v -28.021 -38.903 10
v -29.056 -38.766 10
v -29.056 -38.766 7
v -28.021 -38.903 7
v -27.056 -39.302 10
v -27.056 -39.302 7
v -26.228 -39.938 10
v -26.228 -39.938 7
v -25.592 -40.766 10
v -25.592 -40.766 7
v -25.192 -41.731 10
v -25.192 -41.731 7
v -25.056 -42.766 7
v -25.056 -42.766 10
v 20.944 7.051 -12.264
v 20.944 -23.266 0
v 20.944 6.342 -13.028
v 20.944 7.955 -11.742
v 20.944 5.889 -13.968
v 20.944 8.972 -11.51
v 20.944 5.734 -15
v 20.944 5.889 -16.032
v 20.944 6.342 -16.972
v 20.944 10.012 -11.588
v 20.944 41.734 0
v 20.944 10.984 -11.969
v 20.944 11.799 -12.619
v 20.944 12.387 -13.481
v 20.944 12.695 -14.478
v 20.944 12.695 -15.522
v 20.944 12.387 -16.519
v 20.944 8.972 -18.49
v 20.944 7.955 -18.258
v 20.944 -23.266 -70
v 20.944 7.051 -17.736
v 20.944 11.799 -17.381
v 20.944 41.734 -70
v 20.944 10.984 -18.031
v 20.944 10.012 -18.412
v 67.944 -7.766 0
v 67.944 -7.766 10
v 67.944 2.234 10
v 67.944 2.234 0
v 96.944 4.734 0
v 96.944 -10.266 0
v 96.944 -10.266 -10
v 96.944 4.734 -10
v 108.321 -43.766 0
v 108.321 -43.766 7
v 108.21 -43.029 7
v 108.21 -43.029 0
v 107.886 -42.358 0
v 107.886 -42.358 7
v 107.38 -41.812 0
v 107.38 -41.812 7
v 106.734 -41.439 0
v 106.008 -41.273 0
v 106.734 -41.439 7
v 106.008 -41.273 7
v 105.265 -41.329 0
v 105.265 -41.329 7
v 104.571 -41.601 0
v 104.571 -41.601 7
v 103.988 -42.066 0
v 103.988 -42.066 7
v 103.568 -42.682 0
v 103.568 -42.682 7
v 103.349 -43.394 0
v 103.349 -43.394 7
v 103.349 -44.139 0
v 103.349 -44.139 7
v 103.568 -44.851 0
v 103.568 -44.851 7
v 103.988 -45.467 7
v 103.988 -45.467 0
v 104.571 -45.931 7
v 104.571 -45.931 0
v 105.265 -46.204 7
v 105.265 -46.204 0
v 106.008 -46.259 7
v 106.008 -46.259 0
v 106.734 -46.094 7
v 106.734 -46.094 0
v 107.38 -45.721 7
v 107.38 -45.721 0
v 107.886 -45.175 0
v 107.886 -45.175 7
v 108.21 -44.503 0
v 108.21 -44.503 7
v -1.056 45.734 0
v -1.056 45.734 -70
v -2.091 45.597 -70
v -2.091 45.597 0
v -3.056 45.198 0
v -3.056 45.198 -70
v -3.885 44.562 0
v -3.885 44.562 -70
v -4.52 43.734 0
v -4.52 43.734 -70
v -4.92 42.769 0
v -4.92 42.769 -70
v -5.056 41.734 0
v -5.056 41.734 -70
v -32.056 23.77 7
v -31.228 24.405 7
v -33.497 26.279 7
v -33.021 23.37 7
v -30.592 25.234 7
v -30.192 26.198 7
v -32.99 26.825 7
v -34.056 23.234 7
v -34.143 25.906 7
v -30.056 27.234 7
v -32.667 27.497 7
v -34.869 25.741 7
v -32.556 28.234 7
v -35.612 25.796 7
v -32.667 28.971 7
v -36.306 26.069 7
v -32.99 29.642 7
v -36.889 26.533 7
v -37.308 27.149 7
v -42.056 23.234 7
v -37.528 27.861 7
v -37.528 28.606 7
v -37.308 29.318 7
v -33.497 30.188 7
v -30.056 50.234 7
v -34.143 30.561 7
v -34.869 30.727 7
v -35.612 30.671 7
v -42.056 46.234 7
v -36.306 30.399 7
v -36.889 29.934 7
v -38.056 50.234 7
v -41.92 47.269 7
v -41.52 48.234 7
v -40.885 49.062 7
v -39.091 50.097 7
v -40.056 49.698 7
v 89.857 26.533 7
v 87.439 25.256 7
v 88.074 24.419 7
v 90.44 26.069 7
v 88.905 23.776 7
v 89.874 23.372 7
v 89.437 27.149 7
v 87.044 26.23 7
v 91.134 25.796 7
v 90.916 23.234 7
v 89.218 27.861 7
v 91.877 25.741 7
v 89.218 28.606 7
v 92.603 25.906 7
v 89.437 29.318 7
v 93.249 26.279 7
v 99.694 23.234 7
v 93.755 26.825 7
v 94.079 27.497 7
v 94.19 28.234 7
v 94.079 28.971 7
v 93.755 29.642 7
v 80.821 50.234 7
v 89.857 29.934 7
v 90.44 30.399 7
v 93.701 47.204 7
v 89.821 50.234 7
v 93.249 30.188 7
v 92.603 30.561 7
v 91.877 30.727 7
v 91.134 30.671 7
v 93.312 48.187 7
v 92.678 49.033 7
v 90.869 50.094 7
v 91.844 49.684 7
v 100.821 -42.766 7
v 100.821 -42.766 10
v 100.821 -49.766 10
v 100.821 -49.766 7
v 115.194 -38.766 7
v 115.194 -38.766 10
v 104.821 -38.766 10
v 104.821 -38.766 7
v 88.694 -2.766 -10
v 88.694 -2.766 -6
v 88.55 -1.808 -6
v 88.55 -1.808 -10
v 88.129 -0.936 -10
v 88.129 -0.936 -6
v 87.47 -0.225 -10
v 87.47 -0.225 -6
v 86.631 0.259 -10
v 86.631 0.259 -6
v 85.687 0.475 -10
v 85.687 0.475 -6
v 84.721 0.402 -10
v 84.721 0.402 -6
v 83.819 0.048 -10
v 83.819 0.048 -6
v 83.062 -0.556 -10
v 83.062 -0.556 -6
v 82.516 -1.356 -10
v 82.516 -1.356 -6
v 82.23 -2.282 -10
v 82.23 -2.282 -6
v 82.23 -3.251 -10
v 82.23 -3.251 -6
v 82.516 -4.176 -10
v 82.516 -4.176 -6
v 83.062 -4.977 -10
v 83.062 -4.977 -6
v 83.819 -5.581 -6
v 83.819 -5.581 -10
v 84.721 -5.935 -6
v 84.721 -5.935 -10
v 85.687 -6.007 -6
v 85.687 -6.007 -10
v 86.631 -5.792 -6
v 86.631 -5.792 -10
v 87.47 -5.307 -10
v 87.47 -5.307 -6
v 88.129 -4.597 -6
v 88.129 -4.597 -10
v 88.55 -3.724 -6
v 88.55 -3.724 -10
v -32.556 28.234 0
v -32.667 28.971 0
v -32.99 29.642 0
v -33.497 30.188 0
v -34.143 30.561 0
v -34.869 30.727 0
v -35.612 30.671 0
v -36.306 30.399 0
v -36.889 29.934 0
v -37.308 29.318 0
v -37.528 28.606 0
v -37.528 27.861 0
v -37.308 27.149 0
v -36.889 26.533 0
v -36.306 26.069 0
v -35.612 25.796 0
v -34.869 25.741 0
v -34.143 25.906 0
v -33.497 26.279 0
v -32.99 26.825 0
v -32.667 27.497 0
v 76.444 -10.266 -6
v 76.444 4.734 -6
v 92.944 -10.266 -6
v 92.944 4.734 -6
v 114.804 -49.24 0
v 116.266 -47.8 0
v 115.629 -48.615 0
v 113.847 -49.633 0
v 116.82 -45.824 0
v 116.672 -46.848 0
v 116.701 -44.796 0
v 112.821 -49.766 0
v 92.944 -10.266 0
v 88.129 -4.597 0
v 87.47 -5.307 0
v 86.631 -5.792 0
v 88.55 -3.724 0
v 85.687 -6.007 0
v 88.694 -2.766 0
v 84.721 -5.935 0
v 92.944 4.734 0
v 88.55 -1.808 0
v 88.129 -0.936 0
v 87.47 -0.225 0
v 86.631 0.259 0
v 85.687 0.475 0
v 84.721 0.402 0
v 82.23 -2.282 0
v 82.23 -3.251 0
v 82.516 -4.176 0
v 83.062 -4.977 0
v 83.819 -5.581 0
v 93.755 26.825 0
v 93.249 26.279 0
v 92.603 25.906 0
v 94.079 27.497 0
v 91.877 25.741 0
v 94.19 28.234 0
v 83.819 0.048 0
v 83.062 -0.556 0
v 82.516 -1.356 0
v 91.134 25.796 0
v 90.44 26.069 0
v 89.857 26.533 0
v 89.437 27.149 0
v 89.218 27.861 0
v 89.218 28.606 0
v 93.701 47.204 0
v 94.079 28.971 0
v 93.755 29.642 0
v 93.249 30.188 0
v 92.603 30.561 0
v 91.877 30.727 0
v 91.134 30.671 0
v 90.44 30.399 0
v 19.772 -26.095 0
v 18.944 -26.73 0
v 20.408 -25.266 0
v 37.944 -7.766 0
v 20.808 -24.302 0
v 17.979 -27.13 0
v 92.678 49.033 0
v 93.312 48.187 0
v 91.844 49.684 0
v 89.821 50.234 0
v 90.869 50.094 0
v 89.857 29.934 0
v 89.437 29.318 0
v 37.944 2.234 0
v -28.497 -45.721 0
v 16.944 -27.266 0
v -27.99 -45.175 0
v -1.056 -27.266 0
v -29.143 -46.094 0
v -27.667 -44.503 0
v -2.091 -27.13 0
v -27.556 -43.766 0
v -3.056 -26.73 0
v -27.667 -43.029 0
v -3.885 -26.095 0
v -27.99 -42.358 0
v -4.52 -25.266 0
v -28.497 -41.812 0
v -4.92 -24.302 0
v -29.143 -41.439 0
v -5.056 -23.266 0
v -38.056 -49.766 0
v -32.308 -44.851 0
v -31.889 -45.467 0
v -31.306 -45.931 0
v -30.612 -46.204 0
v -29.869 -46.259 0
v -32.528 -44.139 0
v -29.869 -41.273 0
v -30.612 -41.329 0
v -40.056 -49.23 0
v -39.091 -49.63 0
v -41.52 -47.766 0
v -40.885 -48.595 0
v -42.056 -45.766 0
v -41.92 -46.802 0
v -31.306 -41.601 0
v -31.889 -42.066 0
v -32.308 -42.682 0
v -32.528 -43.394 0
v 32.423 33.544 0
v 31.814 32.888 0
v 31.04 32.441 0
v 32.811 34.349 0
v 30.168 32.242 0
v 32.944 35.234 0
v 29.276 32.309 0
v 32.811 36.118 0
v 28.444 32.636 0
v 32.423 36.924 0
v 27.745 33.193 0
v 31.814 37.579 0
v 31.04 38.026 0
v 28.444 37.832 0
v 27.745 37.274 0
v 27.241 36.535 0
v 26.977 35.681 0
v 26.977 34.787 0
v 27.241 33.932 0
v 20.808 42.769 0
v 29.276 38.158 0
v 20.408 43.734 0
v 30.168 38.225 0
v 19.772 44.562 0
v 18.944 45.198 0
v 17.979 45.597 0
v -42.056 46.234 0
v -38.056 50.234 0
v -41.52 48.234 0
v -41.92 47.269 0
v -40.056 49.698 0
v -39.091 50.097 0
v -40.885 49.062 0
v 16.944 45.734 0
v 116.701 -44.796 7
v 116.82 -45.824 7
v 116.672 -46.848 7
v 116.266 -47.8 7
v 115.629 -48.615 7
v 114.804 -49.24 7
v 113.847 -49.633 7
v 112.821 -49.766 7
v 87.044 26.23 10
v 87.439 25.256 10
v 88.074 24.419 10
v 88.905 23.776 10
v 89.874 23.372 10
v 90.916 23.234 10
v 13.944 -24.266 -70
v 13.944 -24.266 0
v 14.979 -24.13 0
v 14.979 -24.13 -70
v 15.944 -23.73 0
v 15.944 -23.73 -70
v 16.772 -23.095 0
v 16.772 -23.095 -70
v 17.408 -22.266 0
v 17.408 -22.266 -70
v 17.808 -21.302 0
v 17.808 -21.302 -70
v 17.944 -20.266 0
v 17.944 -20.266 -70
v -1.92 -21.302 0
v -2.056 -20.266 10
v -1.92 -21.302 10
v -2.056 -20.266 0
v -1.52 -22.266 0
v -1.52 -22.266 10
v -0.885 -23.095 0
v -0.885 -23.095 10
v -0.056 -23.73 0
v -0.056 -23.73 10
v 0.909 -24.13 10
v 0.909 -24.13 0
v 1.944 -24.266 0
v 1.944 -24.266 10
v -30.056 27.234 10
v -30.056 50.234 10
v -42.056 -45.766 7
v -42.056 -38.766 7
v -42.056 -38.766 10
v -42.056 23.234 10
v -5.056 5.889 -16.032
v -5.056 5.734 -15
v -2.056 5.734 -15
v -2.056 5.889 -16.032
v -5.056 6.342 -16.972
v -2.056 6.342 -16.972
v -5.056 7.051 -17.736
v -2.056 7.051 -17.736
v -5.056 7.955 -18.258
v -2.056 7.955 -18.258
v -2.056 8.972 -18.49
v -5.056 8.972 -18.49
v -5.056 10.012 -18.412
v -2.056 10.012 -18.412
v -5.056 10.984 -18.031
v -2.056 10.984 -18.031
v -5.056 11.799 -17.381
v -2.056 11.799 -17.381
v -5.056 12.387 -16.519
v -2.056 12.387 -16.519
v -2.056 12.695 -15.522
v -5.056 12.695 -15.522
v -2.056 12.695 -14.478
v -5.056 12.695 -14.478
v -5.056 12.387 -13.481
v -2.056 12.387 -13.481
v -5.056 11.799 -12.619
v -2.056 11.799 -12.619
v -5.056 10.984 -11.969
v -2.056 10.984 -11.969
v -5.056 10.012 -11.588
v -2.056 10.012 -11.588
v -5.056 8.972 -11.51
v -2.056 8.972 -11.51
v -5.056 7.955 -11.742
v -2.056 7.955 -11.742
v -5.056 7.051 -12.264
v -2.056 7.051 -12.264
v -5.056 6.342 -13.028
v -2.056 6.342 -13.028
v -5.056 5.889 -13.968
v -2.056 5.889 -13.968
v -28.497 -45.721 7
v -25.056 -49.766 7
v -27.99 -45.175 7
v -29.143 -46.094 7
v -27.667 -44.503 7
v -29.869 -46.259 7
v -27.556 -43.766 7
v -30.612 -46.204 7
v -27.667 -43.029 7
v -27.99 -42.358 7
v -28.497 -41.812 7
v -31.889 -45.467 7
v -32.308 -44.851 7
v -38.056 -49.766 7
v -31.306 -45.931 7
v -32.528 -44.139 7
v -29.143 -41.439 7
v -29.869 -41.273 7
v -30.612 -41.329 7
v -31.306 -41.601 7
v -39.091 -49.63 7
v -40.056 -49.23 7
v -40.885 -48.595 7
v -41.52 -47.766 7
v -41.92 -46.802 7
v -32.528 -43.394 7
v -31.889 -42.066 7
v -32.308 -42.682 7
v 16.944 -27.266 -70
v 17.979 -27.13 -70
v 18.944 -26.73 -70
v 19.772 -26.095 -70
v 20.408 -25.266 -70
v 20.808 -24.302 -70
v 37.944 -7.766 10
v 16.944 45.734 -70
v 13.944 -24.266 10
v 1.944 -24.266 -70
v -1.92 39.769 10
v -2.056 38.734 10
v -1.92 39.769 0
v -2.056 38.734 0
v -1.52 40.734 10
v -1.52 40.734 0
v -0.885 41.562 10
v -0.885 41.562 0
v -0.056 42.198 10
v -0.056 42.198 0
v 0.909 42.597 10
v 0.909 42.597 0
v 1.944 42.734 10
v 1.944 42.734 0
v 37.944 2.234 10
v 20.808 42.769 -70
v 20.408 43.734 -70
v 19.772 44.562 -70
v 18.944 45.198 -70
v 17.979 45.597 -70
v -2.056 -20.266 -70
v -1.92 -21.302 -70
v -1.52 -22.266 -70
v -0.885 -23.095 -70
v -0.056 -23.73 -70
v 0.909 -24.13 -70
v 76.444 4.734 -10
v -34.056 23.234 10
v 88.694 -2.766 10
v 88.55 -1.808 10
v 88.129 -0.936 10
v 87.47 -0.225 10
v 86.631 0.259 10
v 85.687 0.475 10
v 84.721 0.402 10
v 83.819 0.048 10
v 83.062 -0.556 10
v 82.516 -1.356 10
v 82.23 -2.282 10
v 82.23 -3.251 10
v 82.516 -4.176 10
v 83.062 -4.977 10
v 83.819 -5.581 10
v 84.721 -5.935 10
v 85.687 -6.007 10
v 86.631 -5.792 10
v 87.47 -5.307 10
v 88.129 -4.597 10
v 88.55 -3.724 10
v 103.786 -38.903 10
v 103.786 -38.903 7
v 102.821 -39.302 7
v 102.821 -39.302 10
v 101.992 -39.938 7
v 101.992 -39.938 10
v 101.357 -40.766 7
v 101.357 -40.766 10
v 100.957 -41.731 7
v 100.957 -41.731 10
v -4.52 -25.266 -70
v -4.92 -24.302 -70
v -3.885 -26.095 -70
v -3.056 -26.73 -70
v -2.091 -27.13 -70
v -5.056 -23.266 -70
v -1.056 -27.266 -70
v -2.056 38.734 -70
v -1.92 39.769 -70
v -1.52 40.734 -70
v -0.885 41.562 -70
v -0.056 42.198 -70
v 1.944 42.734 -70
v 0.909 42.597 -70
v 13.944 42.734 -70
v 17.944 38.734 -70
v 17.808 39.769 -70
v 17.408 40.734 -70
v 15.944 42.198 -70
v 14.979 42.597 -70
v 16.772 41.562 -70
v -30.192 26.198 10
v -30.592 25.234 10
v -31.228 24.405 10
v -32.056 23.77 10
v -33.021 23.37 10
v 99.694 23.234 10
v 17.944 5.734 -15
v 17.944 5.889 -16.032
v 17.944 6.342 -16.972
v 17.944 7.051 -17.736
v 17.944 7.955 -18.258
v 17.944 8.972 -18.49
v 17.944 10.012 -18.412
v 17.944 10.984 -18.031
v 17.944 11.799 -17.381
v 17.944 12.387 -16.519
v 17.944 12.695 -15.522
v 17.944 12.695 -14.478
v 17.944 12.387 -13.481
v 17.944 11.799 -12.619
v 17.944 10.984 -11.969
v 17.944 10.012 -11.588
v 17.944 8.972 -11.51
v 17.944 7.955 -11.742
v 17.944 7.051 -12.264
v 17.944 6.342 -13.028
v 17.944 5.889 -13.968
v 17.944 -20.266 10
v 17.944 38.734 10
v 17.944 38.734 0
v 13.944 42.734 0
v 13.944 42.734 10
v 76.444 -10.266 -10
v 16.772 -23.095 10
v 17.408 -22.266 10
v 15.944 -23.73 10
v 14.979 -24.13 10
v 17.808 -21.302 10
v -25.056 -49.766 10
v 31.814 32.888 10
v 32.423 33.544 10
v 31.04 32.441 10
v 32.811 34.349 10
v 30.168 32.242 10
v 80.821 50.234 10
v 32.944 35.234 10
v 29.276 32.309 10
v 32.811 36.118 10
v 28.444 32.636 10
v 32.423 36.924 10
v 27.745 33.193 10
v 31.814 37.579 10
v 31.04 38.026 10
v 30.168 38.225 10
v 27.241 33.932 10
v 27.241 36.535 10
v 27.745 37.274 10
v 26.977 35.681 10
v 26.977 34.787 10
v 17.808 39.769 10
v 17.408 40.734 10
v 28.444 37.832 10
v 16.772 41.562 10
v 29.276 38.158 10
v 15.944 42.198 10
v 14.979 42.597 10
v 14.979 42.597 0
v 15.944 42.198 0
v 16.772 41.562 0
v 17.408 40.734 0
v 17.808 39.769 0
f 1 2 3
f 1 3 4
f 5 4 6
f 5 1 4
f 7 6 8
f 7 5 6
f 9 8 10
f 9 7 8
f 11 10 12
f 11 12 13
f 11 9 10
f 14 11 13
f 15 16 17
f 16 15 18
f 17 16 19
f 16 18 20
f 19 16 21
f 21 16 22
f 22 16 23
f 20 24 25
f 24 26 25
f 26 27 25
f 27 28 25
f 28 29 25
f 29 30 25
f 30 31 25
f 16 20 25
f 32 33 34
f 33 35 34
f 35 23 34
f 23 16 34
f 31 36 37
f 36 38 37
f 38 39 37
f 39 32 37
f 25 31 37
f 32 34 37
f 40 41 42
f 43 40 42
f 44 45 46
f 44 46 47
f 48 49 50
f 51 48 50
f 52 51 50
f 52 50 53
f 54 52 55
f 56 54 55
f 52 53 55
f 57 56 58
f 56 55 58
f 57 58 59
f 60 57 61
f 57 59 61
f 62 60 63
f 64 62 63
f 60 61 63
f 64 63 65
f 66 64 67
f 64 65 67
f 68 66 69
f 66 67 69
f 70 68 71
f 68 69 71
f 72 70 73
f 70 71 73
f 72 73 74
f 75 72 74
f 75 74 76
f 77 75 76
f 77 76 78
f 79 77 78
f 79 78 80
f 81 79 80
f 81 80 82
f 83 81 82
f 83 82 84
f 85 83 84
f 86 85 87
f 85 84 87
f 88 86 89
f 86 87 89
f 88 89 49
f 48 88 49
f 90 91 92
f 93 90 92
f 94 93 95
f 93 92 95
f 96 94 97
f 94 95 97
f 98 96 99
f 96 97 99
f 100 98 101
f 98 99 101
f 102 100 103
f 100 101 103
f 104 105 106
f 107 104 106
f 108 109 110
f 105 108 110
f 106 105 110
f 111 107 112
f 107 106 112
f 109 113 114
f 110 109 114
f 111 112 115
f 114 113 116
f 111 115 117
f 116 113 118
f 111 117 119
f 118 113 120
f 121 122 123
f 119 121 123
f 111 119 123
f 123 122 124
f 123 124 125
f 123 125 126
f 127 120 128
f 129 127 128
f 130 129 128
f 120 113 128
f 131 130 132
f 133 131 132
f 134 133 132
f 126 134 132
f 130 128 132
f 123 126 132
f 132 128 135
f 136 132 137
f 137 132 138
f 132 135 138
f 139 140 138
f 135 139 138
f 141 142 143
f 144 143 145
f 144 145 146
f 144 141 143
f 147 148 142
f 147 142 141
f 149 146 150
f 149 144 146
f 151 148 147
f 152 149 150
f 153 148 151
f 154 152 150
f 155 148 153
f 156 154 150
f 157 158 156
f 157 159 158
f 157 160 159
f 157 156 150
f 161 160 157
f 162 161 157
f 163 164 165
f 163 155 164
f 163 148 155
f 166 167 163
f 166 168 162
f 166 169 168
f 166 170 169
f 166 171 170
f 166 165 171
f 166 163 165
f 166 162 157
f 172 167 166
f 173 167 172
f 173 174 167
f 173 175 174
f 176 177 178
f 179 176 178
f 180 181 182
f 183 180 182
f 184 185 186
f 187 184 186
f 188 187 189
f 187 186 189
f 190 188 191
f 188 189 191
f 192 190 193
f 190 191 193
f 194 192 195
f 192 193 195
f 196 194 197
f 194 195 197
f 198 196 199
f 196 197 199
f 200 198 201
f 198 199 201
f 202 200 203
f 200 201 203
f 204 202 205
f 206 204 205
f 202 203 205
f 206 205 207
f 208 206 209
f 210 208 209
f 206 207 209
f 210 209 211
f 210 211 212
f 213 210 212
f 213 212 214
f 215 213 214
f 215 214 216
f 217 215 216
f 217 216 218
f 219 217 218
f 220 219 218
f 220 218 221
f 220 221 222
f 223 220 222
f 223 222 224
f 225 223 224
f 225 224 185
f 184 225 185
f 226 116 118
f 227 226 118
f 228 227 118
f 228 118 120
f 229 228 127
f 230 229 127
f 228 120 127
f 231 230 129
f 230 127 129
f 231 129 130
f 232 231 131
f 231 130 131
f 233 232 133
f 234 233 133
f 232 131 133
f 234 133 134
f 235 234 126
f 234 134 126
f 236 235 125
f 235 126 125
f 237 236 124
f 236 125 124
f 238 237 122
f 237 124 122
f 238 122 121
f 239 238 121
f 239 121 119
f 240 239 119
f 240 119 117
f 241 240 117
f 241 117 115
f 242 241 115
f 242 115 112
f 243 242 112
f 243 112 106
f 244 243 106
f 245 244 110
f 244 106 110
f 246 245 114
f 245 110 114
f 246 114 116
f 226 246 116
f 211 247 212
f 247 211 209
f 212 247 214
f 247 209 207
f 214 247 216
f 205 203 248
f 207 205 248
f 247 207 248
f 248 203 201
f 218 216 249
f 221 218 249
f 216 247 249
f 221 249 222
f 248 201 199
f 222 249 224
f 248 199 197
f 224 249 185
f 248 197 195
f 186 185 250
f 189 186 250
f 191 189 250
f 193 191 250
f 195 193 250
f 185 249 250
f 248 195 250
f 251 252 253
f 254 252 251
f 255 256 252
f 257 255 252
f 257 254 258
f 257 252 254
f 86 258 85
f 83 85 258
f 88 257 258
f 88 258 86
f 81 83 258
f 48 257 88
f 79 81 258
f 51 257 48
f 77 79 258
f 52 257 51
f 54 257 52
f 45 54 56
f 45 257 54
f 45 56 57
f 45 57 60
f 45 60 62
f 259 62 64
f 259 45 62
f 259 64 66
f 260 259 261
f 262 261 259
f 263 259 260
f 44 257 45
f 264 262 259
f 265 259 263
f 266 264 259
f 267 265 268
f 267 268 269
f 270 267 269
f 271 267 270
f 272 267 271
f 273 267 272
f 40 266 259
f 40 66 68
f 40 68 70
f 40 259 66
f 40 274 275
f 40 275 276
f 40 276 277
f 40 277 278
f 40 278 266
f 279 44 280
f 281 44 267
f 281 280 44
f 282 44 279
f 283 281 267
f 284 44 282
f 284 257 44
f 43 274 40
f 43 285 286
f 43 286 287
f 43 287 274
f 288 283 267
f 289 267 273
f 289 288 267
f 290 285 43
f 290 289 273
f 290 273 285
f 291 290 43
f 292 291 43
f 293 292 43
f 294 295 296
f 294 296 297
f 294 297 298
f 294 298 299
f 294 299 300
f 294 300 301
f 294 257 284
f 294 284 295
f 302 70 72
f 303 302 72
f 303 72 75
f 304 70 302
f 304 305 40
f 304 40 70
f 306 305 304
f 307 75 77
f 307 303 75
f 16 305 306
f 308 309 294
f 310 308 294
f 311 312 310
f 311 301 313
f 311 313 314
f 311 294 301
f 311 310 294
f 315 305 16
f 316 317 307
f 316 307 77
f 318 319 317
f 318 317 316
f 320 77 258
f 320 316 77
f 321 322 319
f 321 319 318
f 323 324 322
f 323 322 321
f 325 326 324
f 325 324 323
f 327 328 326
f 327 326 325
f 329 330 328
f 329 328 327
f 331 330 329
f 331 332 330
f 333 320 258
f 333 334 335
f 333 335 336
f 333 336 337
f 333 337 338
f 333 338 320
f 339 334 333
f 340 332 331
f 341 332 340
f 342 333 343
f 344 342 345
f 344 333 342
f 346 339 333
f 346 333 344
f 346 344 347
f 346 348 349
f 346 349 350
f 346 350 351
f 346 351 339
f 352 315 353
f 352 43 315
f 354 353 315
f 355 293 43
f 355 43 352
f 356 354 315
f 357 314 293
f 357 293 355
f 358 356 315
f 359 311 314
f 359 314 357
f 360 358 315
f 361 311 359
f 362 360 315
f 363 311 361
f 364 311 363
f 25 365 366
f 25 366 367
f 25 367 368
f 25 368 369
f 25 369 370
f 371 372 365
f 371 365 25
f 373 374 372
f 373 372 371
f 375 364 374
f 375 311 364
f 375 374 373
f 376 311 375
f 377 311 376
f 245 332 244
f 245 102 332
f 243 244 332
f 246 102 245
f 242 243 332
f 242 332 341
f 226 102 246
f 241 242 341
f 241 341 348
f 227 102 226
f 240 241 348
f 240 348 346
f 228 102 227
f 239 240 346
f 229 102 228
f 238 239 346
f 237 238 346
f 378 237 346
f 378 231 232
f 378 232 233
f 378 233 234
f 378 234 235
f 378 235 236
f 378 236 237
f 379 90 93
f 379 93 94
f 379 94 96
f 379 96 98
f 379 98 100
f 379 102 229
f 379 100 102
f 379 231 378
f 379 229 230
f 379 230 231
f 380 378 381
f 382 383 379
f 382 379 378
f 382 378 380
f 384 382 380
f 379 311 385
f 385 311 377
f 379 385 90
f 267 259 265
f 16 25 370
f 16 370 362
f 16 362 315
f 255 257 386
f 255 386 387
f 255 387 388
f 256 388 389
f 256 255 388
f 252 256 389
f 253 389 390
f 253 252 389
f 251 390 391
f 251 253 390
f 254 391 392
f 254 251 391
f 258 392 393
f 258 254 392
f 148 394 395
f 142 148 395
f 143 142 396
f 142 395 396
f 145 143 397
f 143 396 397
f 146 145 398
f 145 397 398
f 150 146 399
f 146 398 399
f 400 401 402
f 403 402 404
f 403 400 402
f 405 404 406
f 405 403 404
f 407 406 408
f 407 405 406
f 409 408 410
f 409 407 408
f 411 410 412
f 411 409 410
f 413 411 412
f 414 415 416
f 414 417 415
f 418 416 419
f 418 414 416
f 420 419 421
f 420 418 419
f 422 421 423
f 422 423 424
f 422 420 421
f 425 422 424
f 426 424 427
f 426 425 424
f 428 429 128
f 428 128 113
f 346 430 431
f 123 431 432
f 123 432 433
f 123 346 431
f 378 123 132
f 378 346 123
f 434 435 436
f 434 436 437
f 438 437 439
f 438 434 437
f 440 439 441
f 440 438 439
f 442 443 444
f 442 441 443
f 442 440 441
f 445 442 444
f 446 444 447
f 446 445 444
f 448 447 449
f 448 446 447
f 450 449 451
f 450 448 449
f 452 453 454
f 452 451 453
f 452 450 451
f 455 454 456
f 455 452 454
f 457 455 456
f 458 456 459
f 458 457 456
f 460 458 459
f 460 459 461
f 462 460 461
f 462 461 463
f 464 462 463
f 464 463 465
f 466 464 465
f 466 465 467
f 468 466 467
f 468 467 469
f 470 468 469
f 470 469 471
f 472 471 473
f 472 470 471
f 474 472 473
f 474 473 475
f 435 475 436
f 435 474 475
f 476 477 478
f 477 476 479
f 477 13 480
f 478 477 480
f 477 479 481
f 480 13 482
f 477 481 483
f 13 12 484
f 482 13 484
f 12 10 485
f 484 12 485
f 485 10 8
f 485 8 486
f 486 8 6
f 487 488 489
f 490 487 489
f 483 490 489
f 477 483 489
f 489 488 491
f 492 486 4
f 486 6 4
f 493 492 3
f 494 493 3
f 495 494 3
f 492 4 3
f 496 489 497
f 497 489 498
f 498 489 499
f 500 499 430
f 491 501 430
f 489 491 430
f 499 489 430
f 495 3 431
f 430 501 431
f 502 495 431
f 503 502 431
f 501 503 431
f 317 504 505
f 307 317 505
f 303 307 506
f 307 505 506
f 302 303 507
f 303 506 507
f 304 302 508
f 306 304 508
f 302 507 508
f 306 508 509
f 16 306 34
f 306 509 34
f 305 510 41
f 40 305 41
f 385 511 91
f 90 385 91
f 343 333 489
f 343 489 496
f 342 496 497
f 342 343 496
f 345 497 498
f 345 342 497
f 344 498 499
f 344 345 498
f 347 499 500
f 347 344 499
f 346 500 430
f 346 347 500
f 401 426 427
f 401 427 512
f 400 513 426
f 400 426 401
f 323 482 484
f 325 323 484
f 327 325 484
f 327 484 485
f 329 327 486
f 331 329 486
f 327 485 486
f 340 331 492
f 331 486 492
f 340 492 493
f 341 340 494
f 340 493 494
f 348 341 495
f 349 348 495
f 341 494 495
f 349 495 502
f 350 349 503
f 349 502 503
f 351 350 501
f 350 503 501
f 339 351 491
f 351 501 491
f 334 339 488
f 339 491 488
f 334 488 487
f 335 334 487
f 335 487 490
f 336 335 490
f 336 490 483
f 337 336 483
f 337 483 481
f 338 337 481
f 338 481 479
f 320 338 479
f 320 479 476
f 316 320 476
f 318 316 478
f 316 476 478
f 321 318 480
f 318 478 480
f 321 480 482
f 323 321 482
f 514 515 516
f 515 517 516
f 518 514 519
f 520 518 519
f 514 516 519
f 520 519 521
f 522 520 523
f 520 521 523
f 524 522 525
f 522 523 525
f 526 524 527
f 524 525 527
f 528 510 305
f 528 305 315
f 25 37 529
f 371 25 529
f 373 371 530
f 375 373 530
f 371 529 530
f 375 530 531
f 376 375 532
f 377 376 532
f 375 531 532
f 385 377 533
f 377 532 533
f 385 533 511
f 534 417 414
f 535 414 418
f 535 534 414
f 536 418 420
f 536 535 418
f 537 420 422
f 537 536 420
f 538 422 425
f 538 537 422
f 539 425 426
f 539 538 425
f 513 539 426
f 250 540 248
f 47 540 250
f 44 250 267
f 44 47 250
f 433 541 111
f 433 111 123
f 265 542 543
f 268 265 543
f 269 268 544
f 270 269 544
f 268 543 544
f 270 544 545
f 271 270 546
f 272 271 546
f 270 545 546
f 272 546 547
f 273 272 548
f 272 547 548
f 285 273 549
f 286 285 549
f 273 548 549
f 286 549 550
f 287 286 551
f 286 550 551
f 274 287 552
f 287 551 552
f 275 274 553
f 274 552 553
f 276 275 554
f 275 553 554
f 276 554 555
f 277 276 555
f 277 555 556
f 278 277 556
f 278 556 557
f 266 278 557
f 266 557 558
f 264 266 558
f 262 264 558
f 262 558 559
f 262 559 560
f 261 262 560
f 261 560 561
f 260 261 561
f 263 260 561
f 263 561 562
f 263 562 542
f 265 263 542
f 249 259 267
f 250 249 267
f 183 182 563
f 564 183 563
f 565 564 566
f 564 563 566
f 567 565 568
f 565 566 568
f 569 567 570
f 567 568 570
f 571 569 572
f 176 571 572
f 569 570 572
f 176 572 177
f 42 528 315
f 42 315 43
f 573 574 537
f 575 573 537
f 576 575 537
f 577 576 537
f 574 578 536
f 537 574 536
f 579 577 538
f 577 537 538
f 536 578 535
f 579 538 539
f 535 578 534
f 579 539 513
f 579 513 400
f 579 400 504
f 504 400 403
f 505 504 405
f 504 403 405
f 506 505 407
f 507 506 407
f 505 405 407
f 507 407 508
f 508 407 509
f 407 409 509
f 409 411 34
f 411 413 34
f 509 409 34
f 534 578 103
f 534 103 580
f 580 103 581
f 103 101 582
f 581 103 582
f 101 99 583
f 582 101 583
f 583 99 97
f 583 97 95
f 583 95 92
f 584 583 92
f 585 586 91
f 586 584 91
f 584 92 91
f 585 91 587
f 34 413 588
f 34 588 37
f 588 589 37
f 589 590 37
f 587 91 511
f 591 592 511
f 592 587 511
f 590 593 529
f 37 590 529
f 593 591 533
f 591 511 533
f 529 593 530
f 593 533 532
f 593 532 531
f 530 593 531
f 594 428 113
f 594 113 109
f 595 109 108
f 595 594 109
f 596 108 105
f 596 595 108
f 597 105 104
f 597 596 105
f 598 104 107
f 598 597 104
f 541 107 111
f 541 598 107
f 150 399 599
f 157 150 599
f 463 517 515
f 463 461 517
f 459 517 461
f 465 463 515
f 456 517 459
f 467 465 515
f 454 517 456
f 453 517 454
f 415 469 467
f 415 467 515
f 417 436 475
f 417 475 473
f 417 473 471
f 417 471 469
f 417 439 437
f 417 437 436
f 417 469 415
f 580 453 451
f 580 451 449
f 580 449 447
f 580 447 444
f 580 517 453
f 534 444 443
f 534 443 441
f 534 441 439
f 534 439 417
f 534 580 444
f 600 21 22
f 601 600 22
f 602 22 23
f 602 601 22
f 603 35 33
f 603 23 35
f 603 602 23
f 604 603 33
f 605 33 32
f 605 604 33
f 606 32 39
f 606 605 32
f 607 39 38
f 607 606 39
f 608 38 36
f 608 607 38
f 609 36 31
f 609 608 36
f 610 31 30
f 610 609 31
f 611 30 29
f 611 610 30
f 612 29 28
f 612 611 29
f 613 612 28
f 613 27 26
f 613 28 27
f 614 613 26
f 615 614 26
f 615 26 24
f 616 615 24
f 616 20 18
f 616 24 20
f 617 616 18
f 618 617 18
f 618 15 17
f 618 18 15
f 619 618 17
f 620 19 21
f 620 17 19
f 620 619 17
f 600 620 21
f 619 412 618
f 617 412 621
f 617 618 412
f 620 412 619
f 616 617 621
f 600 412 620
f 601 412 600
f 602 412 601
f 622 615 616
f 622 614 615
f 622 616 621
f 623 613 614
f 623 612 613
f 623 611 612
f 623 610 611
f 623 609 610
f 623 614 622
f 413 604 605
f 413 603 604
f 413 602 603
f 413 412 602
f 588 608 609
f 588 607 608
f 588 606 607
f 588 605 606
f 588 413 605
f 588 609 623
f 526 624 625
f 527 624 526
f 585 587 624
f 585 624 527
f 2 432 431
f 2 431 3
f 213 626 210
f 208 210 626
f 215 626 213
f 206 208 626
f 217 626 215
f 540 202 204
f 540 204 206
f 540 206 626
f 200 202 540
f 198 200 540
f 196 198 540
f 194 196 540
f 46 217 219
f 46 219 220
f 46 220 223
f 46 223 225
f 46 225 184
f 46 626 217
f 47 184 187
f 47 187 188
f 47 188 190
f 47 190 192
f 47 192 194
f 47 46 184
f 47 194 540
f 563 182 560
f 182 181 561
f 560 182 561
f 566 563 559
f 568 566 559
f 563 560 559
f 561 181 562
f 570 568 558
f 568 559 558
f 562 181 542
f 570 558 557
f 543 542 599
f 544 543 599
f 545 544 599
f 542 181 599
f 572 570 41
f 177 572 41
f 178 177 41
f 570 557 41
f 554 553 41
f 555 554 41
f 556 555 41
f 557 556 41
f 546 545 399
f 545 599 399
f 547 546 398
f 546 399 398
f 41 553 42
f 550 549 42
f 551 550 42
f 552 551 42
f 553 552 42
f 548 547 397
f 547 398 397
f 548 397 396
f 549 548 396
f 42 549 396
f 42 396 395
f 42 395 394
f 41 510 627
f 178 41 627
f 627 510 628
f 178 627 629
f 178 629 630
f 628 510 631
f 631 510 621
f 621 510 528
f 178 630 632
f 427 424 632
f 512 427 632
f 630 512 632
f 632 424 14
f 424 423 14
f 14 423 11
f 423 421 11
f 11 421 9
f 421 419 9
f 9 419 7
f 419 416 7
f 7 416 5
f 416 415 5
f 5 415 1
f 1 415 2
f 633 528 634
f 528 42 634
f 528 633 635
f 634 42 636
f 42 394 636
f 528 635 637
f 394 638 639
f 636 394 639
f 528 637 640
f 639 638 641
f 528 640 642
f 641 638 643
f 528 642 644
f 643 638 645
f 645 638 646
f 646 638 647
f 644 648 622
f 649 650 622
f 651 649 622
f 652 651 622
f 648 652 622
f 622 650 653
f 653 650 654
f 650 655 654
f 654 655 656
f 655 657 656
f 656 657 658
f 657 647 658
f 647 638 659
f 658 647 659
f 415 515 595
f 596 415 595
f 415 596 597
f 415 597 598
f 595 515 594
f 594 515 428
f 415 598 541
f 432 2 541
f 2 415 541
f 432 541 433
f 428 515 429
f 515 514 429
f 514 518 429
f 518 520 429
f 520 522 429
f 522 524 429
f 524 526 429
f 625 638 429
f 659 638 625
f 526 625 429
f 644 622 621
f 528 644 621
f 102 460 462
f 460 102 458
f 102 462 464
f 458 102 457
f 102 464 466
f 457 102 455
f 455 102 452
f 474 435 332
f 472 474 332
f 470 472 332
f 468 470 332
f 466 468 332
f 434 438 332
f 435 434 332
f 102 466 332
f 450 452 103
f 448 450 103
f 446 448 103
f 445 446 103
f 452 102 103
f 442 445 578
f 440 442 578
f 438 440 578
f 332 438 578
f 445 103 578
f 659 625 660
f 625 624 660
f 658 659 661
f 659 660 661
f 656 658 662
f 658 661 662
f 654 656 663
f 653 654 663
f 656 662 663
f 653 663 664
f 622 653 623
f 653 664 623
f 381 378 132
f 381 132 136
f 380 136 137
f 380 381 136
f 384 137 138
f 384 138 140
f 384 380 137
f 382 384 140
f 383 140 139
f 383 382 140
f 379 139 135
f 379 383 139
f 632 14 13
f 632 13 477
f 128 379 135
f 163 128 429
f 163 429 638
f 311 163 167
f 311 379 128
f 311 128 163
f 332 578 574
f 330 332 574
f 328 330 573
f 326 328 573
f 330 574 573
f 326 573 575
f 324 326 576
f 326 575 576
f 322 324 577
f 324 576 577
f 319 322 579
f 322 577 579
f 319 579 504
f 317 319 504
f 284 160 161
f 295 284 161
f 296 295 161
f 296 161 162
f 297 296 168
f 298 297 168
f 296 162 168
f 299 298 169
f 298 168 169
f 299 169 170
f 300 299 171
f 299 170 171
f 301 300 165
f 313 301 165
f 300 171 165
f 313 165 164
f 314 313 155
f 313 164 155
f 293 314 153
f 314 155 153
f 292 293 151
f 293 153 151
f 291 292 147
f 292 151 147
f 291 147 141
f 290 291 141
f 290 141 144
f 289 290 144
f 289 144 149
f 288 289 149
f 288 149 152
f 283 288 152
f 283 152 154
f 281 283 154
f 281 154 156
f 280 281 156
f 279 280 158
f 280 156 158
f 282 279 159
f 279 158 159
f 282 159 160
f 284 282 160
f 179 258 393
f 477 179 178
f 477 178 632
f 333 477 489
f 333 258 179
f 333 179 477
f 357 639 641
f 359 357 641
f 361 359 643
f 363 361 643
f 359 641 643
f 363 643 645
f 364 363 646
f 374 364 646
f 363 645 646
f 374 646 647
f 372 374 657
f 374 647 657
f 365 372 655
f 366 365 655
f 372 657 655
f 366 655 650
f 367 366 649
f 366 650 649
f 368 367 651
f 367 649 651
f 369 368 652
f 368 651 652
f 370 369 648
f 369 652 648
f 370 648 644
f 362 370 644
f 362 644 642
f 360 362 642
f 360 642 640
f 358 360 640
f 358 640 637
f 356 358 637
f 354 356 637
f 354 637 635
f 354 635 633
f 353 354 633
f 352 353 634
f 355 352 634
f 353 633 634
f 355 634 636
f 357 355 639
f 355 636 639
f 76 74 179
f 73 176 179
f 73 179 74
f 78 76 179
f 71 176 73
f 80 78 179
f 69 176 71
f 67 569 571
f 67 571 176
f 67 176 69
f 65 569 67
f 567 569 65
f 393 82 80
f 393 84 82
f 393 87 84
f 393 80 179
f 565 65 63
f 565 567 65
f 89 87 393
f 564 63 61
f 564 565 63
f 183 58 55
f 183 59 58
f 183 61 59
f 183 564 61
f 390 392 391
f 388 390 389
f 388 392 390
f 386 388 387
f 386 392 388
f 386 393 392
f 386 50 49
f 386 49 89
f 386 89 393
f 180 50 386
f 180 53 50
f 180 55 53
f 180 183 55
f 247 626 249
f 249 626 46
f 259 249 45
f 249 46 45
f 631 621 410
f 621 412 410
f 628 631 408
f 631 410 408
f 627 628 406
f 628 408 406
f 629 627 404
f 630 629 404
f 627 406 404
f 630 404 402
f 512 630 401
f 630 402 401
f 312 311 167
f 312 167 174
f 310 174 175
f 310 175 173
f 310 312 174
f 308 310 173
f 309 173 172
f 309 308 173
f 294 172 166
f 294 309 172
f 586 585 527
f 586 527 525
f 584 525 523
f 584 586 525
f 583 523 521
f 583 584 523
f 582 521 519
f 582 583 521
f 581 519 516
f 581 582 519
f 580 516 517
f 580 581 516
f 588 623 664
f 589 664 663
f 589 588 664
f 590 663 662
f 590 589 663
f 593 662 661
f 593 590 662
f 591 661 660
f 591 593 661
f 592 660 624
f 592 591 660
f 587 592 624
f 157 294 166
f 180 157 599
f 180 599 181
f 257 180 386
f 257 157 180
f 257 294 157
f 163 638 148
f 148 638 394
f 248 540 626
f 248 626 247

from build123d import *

# Parameters (mm, degrees)
BOSS_EXTRUDE1_DEPTH = 10
SKETCH2_R           = 3
SKETCH2_W           = 20
SKETCH2_H           = 67
SKETCH2_W_2         = 30
SKETCH2_H_2         = 10
CUT_EXTRUDE1_DEPTH  = 10
FILLET1_R           = 4
BOSS_EXTRUDE2_START = 70
BOSS_EXTRUDE2_DEPTH = 70
CUT_EXTRUDE5_DEPTH  = 3
SKETCH7_R           = 2.5
CUT_EXTRUDE6_DEPTH  = 7
CUT_EXTRUDE8_START  = -5
SKETCH8_R           = 3.5
CUT_EXTRUDE8_DEPTH  = 30
SKETCH9_W           = 4
SKETCH9_H           = 15
BOSS_EXTRUDE3_DEPTH = 10
SKETCH10_W          = 4
SKETCH10_H          = 15
BOSS_EXTRUDE4_DEPTH = 16.5
SKETCH5_R           = 3.25
CUT_EXTRUDE10_DEPTH = 20


with BuildPart() as part:
    # Sketch1 → Boss-Extrude1 (new body)
    with BuildSketch(Plane.XY):
        with BuildLine():
            Line((-38.056074766, 50.23364486), (89.820819608, 50.23364486))
            ThreePointArc((89.820819608, 50.23364486), (92.282468446, 49.386466612), (93.701389609, 47.20378736))
            Line((93.701389609, 47.20378736), (116.701389609, -44.79621264))
            ThreePointArc((116.701389609, -44.79621264), (115.97364136, -48.228003978), (112.820819608, -49.76635514))
            Line((112.820819608, -49.76635514), (-38.056074766, -49.76635514))
            ThreePointArc((-38.056074766, -49.76635514), (-40.884501891, -48.594782265), (-42.056074766, -45.76635514))
            Line((-42.056074766, -45.76635514), (-42.056074766, 46.23364486))
            ThreePointArc((-42.056074766, 46.23364486), (-40.884501891, 49.062071985), (-38.056074766, 50.23364486))
        make_face()
    extrude(amount=BOSS_EXTRUDE1_DEPTH)

    # Sketch2 → Cut-Extrude1 (cut)
    with BuildSketch(Plane.XY.offset(10)):
        with Locations((29.943925234, 35.23364486)):
            Circle(SKETCH2_R)
        with Locations((7.943925234, 9.23364486)):
            Rectangle(SKETCH2_W, SKETCH2_H)
        with Locations((52.943925234, -2.76635514)):
            Rectangle(SKETCH2_W_2, SKETCH2_H_2)
    extrude(amount=-CUT_EXTRUDE1_DEPTH, mode=Mode.SUBTRACT)

    # Fillet1
    fillet1_edges = [part.edges().sort_by_distance(p)[0] for p in [
        (-2.056074766, -24.26635514, 5),
        (-2.056074766, 42.73364486, 5),
        (17.943925234, 42.73364486, 5),
        (17.943925234, -24.26635514, 5),
    ]]
    fillet(fillet1_edges, radius=FILLET1_R)

    # Sketch4 → Boss-Extrude2 (add)
    with BuildSketch(Plane(origin=(0, 0, 0), x_dir=(-1, 0, 0), z_dir=(0, 0, -1)).offset(BOSS_EXTRUDE2_START)):
        with BuildLine():
            Line((-16.943925234, 45.73364486), (1.056074766, 45.73364486))
            ThreePointArc((1.056074766, 45.73364486), (3.884501891, 44.562071985), (5.056074766, 41.73364486))
            Line((5.056074766, 41.73364486), (5.056074766, -23.26635514))
            ThreePointArc((5.056074766, -23.26635514), (3.884501891, -26.094782265), (1.056074766, -27.26635514))
            Line((1.056074766, -27.26635514), (-16.943925234, -27.26635514))
            ThreePointArc((-16.943925234, -27.26635514), (-19.772352358, -26.094782265), (-20.943925234, -23.26635514))
            Line((-20.943925234, -23.26635514), (-20.943925234, 41.73364486))
            ThreePointArc((-20.943925234, 41.73364486), (-19.772352358, 44.562071985), (-16.943925234, 45.73364486))
        make_face()
        with BuildLine():
            Line((-1.943925234, -24.26635514), (-13.943925234, -24.26635514))
            ThreePointArc((-13.943925234, -24.26635514), (-16.772352358, -23.094782265), (-17.943925234, -20.26635514))
            Line((-17.943925234, -20.26635514), (-17.943925234, 38.73364486))
            ThreePointArc((-17.943925234, 38.73364486), (-16.772352358, 41.562071985), (-13.943925234, 42.73364486))
            Line((-13.943925234, 42.73364486), (-1.943925234, 42.73364486))
            ThreePointArc((-1.943925234, 42.73364486), (0.884501891, 41.562071985), (2.056074766, 38.73364486))
            Line((2.056074766, 38.73364486), (2.056074766, -20.26635514))
            ThreePointArc((2.056074766, -20.26635514), (0.884501891, -23.094782265), (-1.943925234, -24.26635514))
        make_face(mode=Mode.SUBTRACT)
    extrude(amount=-BOSS_EXTRUDE2_DEPTH)

    # Sketch6 → Cut-Extrude5 (cut)
    with BuildSketch(Plane.XY.offset(10)):
        with BuildLine():
            Line((-42.056074766, 50.23364486), (-30.056074766, 50.23364486))
            Line((-30.056074766, 50.23364486), (-30.056074766, 27.23364486))
            ThreePointArc((-30.056074766, 27.23364486), (-31.227647642, 24.405217735), (-34.056074766, 23.23364486))
            Line((-34.056074766, 23.23364486), (-42.056074766, 23.23364486))
            Line((-42.056074766, 23.23364486), (-42.056074766, 50.23364486))
        make_face()
        with BuildLine():
            Line((-25.056074766, -49.76635514), (-42.056074766, -49.76635514))
            Line((-42.056074766, -49.76635514), (-42.056074766, -38.76635514))
            Line((-42.056074766, -38.76635514), (-29.056074766, -38.76635514))
            ThreePointArc((-29.056074766, -38.76635514), (-26.227647642, -39.937928015), (-25.056074766, -42.76635514))
            Line((-25.056074766, -42.76635514), (-25.056074766, -49.76635514))
        make_face()
        with BuildLine():
            Line((80.820819608, 50.23364486), (87.044039625, 26.229796225))
            ThreePointArc((87.044039625, 26.229796225), (88.468109177, 24.070150388), (90.916027217, 23.23364486))
            Line((90.916027217, 23.23364486), (99.820819608, 23.23364486))
            Line((99.820819608, 23.23364486), (99.820819608, 50.23364486))
            Line((99.820819608, 50.23364486), (80.820819608, 50.23364486))
        make_face()
        with BuildLine():
            Line((100.820819608, -49.76635514), (116.820819608, -49.76635514))
            Line((116.820819608, -49.76635514), (116.820819608, -38.76635514))
            Line((116.820819608, -38.76635514), (104.820819608, -38.76635514))
            ThreePointArc((104.820819608, -38.76635514), (101.992392483, -39.937928015), (100.820819608, -42.76635514))
            Line((100.820819608, -42.76635514), (100.820819608, -49.76635514))
        make_face()
    extrude(amount=-CUT_EXTRUDE5_DEPTH, mode=Mode.SUBTRACT)

    # Sketch7 → Cut-Extrude6 (cut)
    with BuildSketch(Plane.XY.offset(7)):
        with Locations((91.68982912, 28.23364486)):
            Circle(SKETCH7_R)
        with Locations((-35.056074766, 28.23364486)):
            Circle(SKETCH7_R)
        with Locations((105.820819608, -43.76635514)):
            Circle(SKETCH7_R)
        with Locations((-30.056074766, -43.76635514)):
            Circle(SKETCH7_R)
    extrude(amount=-CUT_EXTRUDE6_DEPTH, mode=Mode.SUBTRACT)

    # Sketch8 → Cut-Extrude8 (cut)
    with BuildSketch(Plane(origin=(-1.056074766, 45.73364486, -70), x_dir=(0, 0, -1), z_dir=(1, 0, 0)).offset(CUT_EXTRUDE8_START)):
        with Locations(Location((-55, -36.5, 0), (0, 0, 270))):
            Circle(SKETCH8_R)
    extrude(amount=CUT_EXTRUDE8_DEPTH, mode=Mode.SUBTRACT)

    # Sketch9 → Boss-Extrude3 (add)
    with BuildSketch(Plane(origin=(0, 0, 0), x_dir=(-1, 0, 0), z_dir=(0, 0, -1))):
        with Locations((-94.943925234, -2.76635514)):
            Rectangle(SKETCH9_W, SKETCH9_H)
    extrude(amount=BOSS_EXTRUDE3_DEPTH)

    # Sketch10 → Boss-Extrude4 (add)
    with BuildSketch(Plane.ZY.offset(-92.943925234)):
        with Locations((-8, -2.76635514)):
            Rectangle(SKETCH10_W, SKETCH10_H)
    extrude(amount=BOSS_EXTRUDE4_DEPTH)

    # Sketch5 → Cut-Extrude10 (cut)
    with BuildSketch(Plane.XY.offset(10)):
        with Locations((85.443925234, -2.76635514)):
            Circle(SKETCH5_R)
    extrude(amount=-CUT_EXTRUDE10_DEPTH, mode=Mode.SUBTRACT)


solid = part.part
